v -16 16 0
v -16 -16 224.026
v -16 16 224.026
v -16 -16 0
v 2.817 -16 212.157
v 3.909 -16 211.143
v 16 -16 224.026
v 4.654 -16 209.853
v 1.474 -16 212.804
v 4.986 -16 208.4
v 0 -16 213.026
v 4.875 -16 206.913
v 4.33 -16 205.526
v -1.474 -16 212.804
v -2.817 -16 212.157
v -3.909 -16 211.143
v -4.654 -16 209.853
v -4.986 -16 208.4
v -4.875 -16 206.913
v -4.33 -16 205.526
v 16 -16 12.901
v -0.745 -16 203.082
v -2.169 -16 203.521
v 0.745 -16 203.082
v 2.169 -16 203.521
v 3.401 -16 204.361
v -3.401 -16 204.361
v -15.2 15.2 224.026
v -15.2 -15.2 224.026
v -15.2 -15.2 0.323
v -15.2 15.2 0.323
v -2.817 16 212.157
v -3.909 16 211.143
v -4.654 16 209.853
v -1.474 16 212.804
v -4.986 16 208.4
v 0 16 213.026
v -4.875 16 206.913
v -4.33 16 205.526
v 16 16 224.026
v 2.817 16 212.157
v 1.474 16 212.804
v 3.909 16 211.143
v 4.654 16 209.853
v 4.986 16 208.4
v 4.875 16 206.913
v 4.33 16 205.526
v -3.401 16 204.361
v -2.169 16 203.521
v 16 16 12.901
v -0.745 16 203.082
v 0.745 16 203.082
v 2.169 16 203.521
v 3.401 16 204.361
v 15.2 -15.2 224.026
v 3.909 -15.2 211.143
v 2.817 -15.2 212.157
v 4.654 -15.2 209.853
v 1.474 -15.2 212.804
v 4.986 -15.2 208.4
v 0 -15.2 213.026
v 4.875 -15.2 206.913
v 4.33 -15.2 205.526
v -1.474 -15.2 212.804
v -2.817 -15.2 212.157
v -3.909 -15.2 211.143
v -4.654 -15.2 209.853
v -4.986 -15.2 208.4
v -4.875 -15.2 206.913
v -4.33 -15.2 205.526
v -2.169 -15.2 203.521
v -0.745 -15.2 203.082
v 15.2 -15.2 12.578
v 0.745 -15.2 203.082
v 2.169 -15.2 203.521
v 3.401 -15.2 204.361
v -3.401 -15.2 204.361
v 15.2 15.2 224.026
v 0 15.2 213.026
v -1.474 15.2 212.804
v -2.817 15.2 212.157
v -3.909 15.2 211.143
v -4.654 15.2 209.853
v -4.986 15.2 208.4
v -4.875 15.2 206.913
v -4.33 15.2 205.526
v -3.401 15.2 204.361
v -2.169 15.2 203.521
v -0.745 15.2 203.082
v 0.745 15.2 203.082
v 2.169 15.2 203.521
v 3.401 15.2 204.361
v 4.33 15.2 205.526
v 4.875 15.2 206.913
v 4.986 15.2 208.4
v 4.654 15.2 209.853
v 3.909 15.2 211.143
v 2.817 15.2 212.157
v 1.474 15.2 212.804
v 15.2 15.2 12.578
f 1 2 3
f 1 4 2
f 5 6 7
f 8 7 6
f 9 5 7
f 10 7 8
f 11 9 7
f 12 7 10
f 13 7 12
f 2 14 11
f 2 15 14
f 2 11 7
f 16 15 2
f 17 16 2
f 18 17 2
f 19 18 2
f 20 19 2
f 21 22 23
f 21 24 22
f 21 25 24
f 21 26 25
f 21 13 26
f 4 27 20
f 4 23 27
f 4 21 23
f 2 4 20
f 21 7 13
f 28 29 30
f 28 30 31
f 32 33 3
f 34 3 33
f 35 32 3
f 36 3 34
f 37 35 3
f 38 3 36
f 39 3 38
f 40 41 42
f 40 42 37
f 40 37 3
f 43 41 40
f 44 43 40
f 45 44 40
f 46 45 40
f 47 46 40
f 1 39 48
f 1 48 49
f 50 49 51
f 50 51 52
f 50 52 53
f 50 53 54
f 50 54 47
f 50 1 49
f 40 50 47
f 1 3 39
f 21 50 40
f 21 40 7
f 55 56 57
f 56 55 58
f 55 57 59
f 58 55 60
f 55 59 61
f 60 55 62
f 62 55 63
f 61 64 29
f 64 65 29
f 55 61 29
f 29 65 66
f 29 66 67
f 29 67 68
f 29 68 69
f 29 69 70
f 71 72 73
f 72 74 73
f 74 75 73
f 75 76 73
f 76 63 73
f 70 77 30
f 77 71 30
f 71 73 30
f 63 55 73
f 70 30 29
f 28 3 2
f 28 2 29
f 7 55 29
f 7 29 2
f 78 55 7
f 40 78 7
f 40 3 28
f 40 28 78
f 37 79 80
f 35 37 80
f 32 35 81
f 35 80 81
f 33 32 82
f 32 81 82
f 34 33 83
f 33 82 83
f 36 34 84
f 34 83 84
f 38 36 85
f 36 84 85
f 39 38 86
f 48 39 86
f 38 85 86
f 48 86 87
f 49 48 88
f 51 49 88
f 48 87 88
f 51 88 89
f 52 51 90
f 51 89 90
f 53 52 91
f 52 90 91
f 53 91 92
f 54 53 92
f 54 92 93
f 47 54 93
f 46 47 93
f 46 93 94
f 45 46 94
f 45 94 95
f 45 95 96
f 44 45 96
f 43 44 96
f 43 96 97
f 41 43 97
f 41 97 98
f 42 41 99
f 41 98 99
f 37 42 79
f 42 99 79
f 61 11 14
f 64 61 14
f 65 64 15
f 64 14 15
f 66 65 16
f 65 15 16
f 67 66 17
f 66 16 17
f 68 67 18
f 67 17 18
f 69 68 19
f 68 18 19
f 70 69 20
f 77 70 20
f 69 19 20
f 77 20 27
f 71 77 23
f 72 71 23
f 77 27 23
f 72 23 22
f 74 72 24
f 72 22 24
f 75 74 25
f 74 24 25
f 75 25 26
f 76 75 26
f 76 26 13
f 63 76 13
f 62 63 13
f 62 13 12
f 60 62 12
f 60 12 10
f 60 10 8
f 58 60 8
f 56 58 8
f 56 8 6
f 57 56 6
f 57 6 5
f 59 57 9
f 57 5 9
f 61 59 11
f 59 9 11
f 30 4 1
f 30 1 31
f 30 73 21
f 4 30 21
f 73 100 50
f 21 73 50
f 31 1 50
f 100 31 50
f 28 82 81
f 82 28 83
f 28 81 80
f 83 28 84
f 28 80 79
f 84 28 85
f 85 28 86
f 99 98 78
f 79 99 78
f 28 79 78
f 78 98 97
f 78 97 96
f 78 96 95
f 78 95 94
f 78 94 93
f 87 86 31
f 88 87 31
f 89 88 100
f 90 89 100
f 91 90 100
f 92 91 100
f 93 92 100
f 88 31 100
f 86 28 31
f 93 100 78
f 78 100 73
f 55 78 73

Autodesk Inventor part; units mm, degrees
ref_plane "YZ Plane" through (0, 0, 0) normal (1, 0, 0) x (0, 1, 0)
ref_plane "XZ Plane" through (0, 0, 0) normal (0, 1, 0) x (-1, 0, 0)
ref_plane "XY Plane" through (0, 0, 0) normal (0, 0, 1) x (1, 0, 0)
sketch "スケッチ1" plane through (0, 0, 0) normal (0, 0, 1) x (1, 0, 0)
  point P0 (0, 0)
sketch "スケッチ2" plane through (0, 0, 0) normal (0, 0, 1) x (1, 0, 0)
  line L0 (-16, 16) -> (16, 16)
  line L1 (16, 16) -> (16, -16)
  line L2 (16, -16) -> (-16, -16)
  line L3 (-16, -16) -> (-16, 16)
  line L4 (-16, 16) -> (16, -16) construction
  line L5 (16, 16) -> (-16, -16) construction
  line L6 (-15.2, 15.2) -> (15.2, 15.2)
  line L7 (15.2, 15.2) -> (15.2, -15.2)
  line L8 (15.2, -15.2) -> (-15.2, -15.2)
  line L9 (-15.2, -15.2) -> (-15.2, 15.2)
  line L10 (-15.2, 15.2) -> (15.2, -15.2) construction
  line L11 (15.2, 15.2) -> (-15.2, -15.2) construction
  point P0 (0, 0)
  point P1 (0, 0)
  dimension "d0" = 32
  dimension "d1" = 32
  dimension "d2" = 30.4
  dimension "d3" = 30.4
extrude "押し出し1" add sketch "スケッチ2" along normal blind 224.0259
sketch "スケッチ3" plane through (-16, 16, 0) normal (0, 1, 0) x (1, 0, 0)
  line L0 (32, -224.0259) -> (0, -224.0259) projected
  point P0 (16, 0)
  point P1 (16, -208.0259)
  dimension "d6" = 16
hole "穴1" at (0, 16, 208.0259) direction (0, -1, 0) diameter 10 end through all
sketch "スケッチ4" plane through (-16, 16, 0) normal (0, 1, 0) x (1, 0, 0)
  point P0 (16, 0)
sketch "スケッチ5" plane through (-16, 16, 0) normal (0, 1, 0) x (1, 0, 0)
  line L0 (0, 0) -> (32, -12.9008)
  line L1 (32, 0) -> (32, -224.0259) projected
  line L2 (0, 0) -> (34.5026, 0) construction
  line L3 (32, -12.9008) -> (32, 0)
  line L4 (0, 0) -> (32, 0) projected
  line L5 (32, 0) -> (0, 0)
  point P0 (16, 0)
  dimension "d14" = 21.957
extrude "押し出し2" cut sketch "スケッチ5" against normal blind 32
properties part number "アッカーマンpipe1"
